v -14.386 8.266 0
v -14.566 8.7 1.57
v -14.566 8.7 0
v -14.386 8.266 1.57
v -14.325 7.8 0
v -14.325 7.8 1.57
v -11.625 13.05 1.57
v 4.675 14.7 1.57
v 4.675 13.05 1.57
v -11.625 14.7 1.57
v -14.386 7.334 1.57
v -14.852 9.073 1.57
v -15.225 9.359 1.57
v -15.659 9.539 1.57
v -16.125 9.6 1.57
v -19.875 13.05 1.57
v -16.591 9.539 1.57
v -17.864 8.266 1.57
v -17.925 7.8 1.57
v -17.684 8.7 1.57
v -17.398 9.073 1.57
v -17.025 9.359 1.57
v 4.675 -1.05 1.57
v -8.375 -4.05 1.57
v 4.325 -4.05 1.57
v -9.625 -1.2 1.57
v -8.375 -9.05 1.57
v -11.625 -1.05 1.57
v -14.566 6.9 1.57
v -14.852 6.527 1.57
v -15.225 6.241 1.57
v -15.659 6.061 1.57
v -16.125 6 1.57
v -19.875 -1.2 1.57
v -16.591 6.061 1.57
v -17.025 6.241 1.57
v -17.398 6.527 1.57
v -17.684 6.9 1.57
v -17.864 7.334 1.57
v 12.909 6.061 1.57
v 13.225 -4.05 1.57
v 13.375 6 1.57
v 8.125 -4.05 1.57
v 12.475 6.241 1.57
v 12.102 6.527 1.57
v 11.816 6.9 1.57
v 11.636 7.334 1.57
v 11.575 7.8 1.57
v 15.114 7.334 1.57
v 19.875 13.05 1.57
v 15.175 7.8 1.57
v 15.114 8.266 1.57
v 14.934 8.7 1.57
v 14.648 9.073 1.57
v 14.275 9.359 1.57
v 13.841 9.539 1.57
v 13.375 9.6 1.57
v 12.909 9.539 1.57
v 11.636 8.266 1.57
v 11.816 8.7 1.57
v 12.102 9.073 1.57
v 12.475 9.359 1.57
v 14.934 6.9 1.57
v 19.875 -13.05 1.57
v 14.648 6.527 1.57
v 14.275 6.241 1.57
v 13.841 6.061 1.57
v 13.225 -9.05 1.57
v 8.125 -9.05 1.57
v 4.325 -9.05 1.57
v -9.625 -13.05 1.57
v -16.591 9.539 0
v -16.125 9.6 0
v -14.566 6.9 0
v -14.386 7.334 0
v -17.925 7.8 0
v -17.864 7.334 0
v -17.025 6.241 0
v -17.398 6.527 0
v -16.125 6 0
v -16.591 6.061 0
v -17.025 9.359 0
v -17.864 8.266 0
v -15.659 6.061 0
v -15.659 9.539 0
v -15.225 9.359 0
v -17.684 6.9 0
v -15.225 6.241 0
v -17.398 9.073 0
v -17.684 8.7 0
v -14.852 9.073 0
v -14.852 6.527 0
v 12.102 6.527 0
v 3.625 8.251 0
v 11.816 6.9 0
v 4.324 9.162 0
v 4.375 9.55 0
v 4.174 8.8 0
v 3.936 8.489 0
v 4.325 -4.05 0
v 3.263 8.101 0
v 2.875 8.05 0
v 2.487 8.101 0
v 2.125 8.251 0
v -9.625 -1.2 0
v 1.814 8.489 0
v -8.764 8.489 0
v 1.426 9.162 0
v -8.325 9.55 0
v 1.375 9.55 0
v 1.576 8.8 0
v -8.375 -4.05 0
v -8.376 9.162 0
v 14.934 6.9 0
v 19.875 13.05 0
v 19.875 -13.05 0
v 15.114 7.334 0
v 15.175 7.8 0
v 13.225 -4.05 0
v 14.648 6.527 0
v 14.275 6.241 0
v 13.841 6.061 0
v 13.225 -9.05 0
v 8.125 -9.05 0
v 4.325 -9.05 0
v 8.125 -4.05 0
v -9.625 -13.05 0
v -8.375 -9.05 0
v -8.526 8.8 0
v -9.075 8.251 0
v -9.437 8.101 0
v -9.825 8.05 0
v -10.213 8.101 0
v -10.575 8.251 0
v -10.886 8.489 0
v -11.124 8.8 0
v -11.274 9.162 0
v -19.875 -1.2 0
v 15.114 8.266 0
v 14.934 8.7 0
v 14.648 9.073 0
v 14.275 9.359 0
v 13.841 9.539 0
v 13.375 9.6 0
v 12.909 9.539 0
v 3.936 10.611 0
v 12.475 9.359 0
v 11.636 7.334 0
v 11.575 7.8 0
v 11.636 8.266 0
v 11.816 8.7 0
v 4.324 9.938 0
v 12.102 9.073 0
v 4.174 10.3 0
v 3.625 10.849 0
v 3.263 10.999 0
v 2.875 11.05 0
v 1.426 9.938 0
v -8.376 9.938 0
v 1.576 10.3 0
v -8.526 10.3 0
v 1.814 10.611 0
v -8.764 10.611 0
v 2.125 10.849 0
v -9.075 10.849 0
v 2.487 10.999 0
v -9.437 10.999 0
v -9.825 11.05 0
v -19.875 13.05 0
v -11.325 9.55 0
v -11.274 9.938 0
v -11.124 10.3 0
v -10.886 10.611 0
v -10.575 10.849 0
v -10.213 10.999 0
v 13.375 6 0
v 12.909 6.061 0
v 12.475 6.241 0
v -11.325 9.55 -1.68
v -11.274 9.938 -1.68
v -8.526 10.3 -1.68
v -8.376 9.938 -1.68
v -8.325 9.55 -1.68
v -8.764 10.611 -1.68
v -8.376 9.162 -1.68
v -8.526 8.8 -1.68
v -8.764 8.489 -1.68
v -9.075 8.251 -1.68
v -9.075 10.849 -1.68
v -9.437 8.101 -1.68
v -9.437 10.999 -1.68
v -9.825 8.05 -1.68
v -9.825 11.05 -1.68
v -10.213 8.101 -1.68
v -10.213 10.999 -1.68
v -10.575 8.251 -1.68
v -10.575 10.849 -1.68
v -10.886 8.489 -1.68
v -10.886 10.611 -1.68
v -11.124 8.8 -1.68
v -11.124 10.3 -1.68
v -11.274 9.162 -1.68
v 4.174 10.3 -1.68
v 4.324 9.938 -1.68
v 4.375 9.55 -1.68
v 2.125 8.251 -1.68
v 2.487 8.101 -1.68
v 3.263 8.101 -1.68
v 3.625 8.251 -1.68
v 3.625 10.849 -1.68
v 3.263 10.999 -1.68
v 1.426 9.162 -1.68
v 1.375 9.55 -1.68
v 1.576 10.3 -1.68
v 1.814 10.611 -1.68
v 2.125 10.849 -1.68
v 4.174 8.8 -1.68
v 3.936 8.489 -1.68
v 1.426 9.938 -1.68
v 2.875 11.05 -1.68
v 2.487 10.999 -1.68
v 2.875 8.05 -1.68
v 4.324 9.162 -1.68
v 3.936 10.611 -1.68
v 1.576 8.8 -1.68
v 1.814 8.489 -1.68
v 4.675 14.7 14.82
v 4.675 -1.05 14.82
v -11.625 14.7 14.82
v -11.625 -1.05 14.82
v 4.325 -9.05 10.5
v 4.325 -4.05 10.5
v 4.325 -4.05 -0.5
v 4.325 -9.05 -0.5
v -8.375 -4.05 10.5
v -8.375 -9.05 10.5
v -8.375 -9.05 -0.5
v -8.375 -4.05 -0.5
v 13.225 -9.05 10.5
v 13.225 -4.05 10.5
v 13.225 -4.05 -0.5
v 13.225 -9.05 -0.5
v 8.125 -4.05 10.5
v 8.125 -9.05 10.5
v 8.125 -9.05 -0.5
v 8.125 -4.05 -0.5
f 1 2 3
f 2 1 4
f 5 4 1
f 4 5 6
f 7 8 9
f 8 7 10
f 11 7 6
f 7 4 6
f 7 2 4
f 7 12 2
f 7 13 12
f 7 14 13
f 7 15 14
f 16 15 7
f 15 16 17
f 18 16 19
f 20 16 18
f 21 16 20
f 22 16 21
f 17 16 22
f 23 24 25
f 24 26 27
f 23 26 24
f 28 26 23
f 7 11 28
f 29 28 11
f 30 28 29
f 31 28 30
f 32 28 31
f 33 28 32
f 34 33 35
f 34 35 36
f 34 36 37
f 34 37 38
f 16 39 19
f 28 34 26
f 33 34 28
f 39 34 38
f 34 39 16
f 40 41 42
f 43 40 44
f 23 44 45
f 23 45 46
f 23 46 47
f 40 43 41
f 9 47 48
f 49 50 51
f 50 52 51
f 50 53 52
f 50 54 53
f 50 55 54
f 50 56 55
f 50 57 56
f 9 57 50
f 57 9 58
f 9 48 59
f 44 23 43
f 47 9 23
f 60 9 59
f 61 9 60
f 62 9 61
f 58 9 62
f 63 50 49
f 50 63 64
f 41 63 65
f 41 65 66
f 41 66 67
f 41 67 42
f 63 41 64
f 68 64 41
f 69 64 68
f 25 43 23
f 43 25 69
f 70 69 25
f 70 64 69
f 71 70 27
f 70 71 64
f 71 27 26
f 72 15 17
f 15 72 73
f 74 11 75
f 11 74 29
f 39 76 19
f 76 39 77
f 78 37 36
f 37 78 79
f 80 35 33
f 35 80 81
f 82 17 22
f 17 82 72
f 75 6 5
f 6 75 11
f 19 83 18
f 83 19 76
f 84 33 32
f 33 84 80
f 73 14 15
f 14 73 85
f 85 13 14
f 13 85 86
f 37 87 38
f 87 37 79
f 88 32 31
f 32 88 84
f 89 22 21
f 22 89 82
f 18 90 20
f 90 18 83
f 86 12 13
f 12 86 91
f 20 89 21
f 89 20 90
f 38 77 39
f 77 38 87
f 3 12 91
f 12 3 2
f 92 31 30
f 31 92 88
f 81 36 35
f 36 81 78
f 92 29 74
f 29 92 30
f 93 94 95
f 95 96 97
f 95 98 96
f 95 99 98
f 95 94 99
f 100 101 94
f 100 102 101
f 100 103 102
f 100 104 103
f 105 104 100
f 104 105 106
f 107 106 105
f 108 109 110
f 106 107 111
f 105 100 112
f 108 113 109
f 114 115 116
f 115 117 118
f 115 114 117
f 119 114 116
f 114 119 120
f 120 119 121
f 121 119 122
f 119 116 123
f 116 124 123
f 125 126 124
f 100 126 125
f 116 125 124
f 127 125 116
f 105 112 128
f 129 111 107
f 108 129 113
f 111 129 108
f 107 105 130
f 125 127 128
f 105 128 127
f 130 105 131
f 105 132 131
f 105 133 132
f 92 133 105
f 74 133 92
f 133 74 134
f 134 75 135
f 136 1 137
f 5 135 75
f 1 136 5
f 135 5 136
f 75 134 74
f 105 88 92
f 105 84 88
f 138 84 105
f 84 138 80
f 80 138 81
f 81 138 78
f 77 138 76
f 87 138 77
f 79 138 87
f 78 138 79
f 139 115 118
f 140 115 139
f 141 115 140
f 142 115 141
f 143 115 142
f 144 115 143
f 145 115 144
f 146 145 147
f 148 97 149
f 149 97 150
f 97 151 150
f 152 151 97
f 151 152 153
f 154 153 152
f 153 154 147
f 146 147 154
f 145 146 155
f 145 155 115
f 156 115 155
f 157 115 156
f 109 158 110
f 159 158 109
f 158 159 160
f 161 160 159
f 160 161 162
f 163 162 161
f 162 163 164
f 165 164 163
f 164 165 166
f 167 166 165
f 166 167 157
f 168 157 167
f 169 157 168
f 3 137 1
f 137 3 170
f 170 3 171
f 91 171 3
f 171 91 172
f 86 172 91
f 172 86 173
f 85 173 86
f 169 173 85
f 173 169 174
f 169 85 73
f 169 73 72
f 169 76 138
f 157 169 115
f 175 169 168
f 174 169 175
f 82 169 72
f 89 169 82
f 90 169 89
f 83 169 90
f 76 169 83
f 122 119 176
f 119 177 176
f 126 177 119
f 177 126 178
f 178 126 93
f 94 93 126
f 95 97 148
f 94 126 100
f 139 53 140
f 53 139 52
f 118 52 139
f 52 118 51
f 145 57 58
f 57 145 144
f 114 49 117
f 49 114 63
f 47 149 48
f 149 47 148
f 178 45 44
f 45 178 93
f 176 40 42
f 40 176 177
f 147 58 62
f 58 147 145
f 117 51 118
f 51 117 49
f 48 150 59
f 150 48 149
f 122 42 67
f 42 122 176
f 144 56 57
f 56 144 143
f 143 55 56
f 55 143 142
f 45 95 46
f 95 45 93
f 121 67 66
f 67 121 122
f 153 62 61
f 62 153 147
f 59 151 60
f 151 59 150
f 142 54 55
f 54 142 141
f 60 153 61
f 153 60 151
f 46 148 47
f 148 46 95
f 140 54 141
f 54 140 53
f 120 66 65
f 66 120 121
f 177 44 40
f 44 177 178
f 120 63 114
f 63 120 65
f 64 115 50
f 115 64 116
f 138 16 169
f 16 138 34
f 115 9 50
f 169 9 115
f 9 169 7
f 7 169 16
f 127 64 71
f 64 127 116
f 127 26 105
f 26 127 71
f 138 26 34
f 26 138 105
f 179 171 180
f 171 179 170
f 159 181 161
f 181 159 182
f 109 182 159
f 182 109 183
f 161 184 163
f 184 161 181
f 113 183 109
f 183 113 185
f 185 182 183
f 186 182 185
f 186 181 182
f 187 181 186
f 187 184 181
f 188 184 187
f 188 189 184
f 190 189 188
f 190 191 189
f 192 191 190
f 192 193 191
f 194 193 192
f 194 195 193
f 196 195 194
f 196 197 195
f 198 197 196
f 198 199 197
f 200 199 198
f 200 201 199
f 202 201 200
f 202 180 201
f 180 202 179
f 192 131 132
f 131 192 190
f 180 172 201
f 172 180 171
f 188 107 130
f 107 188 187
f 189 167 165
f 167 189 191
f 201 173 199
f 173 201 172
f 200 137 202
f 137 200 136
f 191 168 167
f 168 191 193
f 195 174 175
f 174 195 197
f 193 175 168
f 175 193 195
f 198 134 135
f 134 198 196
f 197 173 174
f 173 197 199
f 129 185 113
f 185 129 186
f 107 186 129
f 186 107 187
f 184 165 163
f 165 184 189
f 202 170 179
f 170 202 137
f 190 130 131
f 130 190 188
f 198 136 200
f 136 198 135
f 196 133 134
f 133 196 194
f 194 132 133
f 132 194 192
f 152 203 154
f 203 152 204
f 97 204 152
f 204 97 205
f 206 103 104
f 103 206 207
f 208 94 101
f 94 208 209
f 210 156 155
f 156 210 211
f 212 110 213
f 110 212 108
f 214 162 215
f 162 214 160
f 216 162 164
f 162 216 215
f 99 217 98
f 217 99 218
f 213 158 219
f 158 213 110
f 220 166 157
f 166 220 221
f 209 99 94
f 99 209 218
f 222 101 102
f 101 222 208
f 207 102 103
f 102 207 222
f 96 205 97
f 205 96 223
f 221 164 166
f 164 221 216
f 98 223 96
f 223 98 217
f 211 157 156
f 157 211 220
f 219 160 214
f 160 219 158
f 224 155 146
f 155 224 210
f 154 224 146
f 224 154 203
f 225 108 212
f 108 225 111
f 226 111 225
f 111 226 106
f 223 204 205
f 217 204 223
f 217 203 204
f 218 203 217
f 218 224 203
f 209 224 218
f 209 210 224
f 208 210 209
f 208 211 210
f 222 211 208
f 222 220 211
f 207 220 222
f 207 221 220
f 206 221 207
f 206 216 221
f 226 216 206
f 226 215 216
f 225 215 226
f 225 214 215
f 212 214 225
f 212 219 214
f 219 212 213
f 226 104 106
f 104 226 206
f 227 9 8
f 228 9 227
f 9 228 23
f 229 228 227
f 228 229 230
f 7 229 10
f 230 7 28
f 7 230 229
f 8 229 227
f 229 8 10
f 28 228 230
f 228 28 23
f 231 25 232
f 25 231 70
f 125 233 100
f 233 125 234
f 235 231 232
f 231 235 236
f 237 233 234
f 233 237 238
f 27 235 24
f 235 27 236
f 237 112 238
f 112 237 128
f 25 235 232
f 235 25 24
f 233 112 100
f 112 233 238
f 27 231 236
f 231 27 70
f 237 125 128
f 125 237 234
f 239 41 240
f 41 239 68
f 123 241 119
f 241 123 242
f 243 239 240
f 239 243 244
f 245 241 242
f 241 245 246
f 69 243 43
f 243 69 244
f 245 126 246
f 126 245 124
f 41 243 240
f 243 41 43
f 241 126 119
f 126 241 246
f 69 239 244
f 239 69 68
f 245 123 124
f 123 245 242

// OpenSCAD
// file: smidge.scad
//
// Copyright (c) Stewart H. Whitman, 2020-2021.
//
// File:    smidge.scad
// Project: General
// License: CC BY-NC-SA 4.0 (Attribution-NonCommercial-ShareAlike)
// Desc:    SMIDGE constant used in preview mode.
//

// Smidge constant for rendering only (to avoid Z-axis fighting, etc.)
SMIDGE = $preview ? 0.01 : 0;
// main file
//
// Copyright (c) Stewart H. Whitman, 2020-2024.
//
// File:    iocrest-nic.scad
// Project: Dell Wyse 5070 2nd Ethernet Adapter Adapter
// License: CC BY-NC-SA 4.0 (Attribution-NonCommercial-ShareAlike)
// Desc:    Mock-up of the very common Realtek RTL8111 Daughter Board
//

include <smidge.scad>;

// IOCREST Realtek Mini PCI-Express Daughter board layout
//
// Part Number: IOCREST IO-M2F8111H-GLAN
//
// The problem with these boards are that the cables are
// large and bulk, so the connectors may need changing out to
// right-angle ones.
//

//
// All these values were measured.
//

// kind:
//
// Unique, for customization.
//
function nic_kind() = "iocrest";

// PCB thickness ~1.57mm (nominal 4-layer PCB thickness)
// PCB width X length as measured (about 1.5" x 1")
function nic_get_pcb_size() = [ 39.75, 26.1, 1.57 ];

// bottom hole positions [left=0, rear=0]
function _nic_get_left_hole() = [ 3.75, nic_get_pcb_size().y - 5.25];
function _nic_get_right_hole() = [ 33.25, nic_get_pcb_size().y - 5.25];
function nic_get_bottom_holes() = [ _nic_get_left_hole(), _nic_get_right_hole() ];
// bottom hole diameter
function nic_get_bottom_hole_diameter() = 3.6;

// ethernet size [left<->right,front<->rear,top<->bottom]
function nic_get_ethernet_size() = [16.30,15.75,13.25];

// ethernet position measures 8.25mm from left side
function _nic_get_ethernet_left_pos() = 8.25;
function _nic_get_ethernet_right_pos() = _nic_get_ethernet_left_pos()+nic_get_ethernet_size().x;
function _nic_get_ethernet_bottom_pos() = nic_get_pcb_size().z;
function nic_get_ethernet_center_pos() = [ (_nic_get_ethernet_left_pos()+_nic_get_ethernet_right_pos())/2, _nic_get_ethernet_bottom_pos() + nic_get_ethernet_size().z/2 ];
function nic_get_ethernet_projection() = 12.0 + nic_get_ethernet_size().y - nic_get_pcb_size().y;

// shield (none)
function nic_get_shield_thickness() = 0;
function nic_get_shield_size() = [];
function nic_get_shield_hole_diameter() = 0;
function nic_get_shield_holes() = [];
function nic_get_shield_z() = 0;
function nic_get_shield_center_pos() = [ 0, 0 ];

// ethernet is equidistant from left or right side (about 7.5mm)
// Layout of the nic board (PCB centered with NIC port hanging out)
module nic(transparency=1.0,center=true,with_shield=true) {

  module hole() {
    translate( [0,0,-SMIDGE] ) cylinder( h = nic_get_pcb_size().z+2*SMIDGE, d=nic_get_bottom_hole_diameter() );
  } // end hole

  // pcb with notch and hole
  module pcb() {
    color( "green", transparency )
      difference() {
	// board
	cube( nic_get_pcb_size() );
	// notch
	translate( [-SMIDGE,-SMIDGE,-SMIDGE] ) cube( nic_get_pcb_size() - [29.5-SMIDGE, 14.25-SMIDGE, -2*SMIDGE] );
        // holes
        for( h = nic_get_bottom_holes() )
	  translate( concat( h, 0 ) ) hole();
      }
  } // end pcb

  module ethernet() {
    color( "silver", transparency )
      translate( [_nic_get_ethernet_left_pos(),12.0,nic_get_pcb_size().z] ) cube( nic_get_ethernet_size() );
    color( "black", transparency ) {
      h = 3.25;
      translate( [_nic_get_ethernet_left_pos()+1.8,nic_get_pcb_size().y-3.5,nic_get_pcb_size().z-h] ) cylinder( h=h, d=3.00 );
      translate( [_nic_get_ethernet_right_pos()-1.8,nic_get_pcb_size().y-3.5,nic_get_pcb_size().z-h] ) cylinder( h=h, d=3.00 );
    }
  } // end ethernet

  module header1() {
    color( "black", transparency )
      translate( [ 11.5, 4, -0.5 ] ) cube( [ 12.7, 5, 11] );
  } // end header1

  module header2() {
    color( "black", transparency )
      translate( [ 28, 4, -0.5 ] ) cube( [ 5.1, 5, 11] );
  } // end header2

  // entire nic
  translate( center ? -[nic_get_pcb_size().x,nic_get_pcb_size().y,0]/2 : [0,0,0] ) {
    pcb();
    ethernet();
    header1();
    header2();
  }
} // end nic

nic($fn=24);
